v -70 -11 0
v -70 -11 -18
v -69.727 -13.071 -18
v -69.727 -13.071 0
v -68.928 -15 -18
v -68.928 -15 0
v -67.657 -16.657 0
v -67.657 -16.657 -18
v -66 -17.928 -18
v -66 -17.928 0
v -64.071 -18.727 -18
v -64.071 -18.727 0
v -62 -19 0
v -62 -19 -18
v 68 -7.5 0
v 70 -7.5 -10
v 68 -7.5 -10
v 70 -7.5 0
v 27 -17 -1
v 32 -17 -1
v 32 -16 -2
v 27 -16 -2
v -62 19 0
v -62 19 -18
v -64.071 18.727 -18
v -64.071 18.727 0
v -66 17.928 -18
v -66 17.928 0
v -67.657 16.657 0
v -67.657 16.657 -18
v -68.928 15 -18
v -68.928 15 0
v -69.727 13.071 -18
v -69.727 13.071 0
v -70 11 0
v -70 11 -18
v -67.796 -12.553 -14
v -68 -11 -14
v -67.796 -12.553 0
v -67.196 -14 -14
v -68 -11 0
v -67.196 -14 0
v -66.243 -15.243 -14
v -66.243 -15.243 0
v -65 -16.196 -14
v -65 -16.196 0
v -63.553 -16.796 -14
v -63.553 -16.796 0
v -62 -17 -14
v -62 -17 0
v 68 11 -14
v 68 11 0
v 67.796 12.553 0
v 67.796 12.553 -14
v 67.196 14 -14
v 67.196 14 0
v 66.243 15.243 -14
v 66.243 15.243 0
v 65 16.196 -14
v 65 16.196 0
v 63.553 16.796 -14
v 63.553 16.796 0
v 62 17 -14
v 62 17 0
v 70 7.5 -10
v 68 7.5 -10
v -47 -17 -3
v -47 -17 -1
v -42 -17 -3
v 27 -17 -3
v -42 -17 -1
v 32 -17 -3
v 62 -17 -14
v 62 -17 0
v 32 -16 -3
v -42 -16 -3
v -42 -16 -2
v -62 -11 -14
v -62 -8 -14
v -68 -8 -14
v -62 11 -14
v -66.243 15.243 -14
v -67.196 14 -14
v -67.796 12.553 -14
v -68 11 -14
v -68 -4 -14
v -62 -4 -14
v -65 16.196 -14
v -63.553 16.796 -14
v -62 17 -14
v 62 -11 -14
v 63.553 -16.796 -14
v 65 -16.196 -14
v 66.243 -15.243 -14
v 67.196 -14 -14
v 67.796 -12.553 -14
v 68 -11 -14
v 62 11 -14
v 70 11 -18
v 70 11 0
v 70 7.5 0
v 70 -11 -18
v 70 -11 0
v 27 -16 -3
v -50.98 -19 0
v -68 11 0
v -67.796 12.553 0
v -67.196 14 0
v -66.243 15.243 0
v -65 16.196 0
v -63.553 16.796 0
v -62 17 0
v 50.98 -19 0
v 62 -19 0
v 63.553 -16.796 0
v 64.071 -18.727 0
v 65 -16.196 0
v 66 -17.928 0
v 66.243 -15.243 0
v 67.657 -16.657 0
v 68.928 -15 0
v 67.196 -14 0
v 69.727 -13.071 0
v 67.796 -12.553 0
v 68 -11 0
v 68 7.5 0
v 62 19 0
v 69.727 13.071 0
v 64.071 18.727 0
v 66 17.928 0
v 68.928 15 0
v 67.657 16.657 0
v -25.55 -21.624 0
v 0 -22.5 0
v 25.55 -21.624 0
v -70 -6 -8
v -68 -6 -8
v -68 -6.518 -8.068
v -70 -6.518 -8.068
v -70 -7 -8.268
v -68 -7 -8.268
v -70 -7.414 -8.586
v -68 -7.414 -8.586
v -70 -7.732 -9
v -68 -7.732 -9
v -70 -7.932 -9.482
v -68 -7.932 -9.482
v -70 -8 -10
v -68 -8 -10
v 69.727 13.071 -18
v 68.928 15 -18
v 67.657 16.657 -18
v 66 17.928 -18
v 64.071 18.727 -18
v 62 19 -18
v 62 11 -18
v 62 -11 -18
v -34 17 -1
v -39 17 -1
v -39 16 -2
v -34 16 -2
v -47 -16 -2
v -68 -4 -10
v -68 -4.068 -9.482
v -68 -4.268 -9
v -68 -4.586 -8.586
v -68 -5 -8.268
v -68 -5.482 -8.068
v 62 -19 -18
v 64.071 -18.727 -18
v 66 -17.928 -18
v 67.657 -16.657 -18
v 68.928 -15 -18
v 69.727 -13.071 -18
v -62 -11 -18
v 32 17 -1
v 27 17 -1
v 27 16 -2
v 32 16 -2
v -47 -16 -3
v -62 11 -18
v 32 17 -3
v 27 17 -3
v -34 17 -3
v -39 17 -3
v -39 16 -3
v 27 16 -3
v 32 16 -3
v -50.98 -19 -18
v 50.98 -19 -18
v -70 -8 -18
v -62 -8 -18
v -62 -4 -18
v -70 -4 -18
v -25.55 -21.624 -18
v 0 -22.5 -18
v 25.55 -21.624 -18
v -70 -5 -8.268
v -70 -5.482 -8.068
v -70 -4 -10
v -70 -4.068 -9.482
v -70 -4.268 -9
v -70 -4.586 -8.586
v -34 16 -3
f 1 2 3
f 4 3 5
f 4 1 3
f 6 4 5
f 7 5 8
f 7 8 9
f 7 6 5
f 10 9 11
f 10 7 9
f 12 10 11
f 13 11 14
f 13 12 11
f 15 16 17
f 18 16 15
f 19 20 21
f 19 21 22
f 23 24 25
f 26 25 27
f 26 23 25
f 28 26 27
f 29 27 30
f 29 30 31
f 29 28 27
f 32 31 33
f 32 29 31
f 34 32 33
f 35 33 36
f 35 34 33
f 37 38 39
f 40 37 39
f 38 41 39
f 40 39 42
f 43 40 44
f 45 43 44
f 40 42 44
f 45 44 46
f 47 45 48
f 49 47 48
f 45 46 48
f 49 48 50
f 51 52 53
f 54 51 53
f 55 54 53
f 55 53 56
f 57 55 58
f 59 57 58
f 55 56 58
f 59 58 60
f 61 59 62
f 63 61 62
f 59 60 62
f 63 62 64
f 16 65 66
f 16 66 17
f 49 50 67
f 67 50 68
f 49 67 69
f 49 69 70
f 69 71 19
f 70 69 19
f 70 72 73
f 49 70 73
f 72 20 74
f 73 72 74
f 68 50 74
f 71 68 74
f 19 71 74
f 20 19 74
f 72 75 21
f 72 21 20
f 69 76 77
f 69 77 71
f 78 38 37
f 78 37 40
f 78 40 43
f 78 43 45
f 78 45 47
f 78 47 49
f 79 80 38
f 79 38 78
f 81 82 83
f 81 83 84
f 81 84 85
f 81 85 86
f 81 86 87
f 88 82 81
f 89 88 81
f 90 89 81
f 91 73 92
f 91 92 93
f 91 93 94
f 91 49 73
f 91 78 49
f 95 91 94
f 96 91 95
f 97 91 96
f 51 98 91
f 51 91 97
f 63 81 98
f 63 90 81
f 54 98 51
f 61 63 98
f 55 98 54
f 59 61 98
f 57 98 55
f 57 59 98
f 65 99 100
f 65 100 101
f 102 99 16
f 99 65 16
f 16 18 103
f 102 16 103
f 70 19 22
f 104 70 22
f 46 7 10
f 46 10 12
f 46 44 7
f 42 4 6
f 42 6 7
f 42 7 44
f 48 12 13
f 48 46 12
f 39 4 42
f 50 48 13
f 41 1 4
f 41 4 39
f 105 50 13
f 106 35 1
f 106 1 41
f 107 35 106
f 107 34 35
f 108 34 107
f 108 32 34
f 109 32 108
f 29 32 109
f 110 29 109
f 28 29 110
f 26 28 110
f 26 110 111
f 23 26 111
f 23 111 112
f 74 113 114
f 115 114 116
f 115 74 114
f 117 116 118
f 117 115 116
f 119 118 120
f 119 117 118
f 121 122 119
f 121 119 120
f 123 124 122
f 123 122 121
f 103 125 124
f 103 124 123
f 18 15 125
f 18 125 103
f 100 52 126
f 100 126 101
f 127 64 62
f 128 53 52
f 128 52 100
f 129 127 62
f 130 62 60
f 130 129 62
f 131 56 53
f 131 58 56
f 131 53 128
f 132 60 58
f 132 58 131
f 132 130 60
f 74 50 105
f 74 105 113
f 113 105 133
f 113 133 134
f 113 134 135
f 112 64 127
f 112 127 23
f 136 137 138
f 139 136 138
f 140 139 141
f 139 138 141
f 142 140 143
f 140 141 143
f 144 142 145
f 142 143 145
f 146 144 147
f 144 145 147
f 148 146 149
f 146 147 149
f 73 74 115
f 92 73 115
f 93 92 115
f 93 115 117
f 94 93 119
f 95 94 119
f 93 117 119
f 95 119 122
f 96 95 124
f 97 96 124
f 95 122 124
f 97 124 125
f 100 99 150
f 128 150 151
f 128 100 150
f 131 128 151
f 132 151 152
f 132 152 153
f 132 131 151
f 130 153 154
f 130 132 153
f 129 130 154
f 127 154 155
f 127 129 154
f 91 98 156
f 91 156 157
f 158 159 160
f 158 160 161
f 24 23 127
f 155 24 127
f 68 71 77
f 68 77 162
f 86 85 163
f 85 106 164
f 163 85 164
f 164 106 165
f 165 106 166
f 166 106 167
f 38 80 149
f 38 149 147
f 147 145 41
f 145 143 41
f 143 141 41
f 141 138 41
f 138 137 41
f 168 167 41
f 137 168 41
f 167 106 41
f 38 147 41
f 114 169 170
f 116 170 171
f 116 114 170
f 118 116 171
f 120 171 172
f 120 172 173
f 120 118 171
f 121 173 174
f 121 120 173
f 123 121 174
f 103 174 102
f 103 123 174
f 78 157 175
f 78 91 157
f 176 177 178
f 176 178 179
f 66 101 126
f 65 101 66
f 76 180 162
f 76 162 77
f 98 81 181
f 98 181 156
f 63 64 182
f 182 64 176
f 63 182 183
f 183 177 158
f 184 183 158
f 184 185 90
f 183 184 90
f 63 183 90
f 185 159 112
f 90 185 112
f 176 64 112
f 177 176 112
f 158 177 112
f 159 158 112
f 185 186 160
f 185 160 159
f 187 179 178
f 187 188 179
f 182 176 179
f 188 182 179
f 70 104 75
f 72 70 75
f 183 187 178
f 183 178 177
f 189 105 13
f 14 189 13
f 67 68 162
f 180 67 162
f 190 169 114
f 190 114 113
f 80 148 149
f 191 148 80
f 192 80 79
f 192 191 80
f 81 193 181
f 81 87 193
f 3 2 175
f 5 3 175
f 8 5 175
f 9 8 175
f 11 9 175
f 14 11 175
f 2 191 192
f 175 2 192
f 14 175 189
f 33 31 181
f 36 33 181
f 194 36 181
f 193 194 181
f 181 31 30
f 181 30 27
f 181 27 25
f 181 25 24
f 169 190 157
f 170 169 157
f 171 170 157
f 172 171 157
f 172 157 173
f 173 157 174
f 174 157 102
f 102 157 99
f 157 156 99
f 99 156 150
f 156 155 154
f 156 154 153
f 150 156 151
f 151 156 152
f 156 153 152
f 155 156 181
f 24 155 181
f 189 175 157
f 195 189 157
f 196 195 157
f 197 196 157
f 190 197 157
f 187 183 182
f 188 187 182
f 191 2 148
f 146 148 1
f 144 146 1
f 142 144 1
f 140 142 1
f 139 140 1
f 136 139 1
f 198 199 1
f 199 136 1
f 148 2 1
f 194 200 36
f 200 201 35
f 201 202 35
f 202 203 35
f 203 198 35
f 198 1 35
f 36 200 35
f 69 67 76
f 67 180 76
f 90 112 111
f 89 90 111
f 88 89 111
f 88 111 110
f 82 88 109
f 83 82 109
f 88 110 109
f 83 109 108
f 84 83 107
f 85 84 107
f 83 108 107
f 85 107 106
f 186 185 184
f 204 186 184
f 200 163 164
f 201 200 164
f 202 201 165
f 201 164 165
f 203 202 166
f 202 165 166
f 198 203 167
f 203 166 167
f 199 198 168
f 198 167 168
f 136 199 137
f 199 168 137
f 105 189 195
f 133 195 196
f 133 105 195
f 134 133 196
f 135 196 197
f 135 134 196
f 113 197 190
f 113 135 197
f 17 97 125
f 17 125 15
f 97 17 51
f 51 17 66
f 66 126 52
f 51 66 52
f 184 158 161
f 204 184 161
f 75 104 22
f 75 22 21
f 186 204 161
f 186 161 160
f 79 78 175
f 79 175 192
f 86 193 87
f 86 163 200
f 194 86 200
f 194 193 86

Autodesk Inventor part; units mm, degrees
ref_plane "YZ Plane" through (0, 0, 0) normal (1, 0, 0) x (0, 1, 0)
ref_plane "XZ Plane" through (0, 0, 0) normal (0, 1, 0) x (-1, 0, 0)
ref_plane "XY Plane" through (0, 0, 0) normal (0, 0, 1) x (1, 0, 0)
sketch "Sketch1" plane through (0, 0, 0) normal (0, 0, 1) x (1, 0, 0)
  line L0 (-62, 19) -> (62, 19)
  line L1 (70, 11) -> (70, -11)
  line L2 (62, -19) -> (-62, -19)
  line L3 (-70, -11) -> (-70, 11)
  arc A0 (-62, 19) -> (-70, 11) centre (-62, 11) ccw
  arc A1 (-70, -11) -> (-62, -19) centre (-62, -11) ccw
  arc A2 (70, 11) -> (62, 19) centre (62, 11) ccw
  arc A3 (62, -19) -> (70, -11) centre (62, -11) ccw
  point P0 (0, 0)
  point P1 (70, -19)
  point P2 (70, 19)
  point P3 (-70, -19)
  dimension "d0" = 140
  dimension "d1" = 38
  dimension "d2" = 70
  dimension "d3" = 19
  dimension "d4" = 8
  dimension "d5" = 8
  dimension "d6" = 8
  dimension "d7" = 8
extrude "Extrusion1" add sketch "Sketch1" against normal blind 18
sketch "Sketch2" plane through (0, 0, 0) normal (0, 0, 1) x (1, 0, 0)
  line L0 (-62, 19) -> (62, 19) projected
  arc A0 (-62, 19) -> (-70, 11) centre (-62, 11) ccw projected
  line L1 (-70, -11) -> (-70, 11) projected
  arc A1 (-70, -11) -> (-62, -19) centre (-62, -11) ccw projected
  line L2 (62, -19) -> (-62, -19) projected
  arc A2 (62, -19) -> (70, -11) centre (62, -11) ccw projected
  line L3 (70, 11) -> (70, -11) projected
  arc A3 (70, 11) -> (62, 19) centre (62, 11) ccw projected
  line L4 (62, 17) -> (-62, 17)
  arc A4 (-62, 17) -> (-68, 11) centre (-62, 11) ccw
  line L5 (-68, 11) -> (-68, -11)
  arc A5 (-68, -11) -> (-62, -17) centre (-62, -11) ccw
  line L6 (-62, -17) -> (62, -17)
  arc A6 (62, -17) -> (68, -11) centre (62, -11) ccw
  line L7 (68, -11) -> (68, 11)
  arc A7 (68, 11) -> (62, 17) centre (62, 11) ccw
  point P0 (0, 0)
  dimension "d10" = 2
extrude "Extrusion2" cut sketch "Sketch2" against normal blind 14 contours A7 L7 A6 L6 A5 L5 A4 L4
sketch "Sketch3" plane through (70, -11, 0) normal (1, 0, 0) x (0, 0, -1)
  line L0 (0, 22) -> (0, 0) projected
  line L1 (-6.9158, 18.5) -> (10, 18.5)
  line L2 (10, 18.5) -> (10, 3.5)
  line L3 (10, 3.5) -> (-6.9158, 3.5)
  line L4 (-6.9158, 3.5) -> (-6.9158, 18.5)
  point P0 (0, 11)
  dimension "d13" = 6.9158
  dimension "d14" = 10
  dimension "d15" = 15
  dimension "d16" = 7.5
extrude "Extrusion3" cut sketch "Sketch3" against normal blind 14
sketch "Sketch4" plane through (0, 0, -14) normal (0, 0, 1) x (1, 0, 0)
  line L0 (-62, -17) -> (62, -17) projected
  line L1 (62, 17) -> (-62, 17) projected
  line L2 (27, 19) -> (32, 19)
  line L3 (32, 19) -> (32, 16)
  line L4 (32, 16) -> (27, 16)
  line L5 (27, 16) -> (27, 19)
  line L6 (32, -19) -> (27, -19)
  line L7 (27, -19) -> (27, -16)
  line L8 (27, -16) -> (32, -16)
  line L9 (32, -16) -> (32, -19)
  line L10 (-42, -19) -> (-47, -19)
  line L11 (-47, -19) -> (-47, -16)
  line L12 (-47, -16) -> (-42, -16)
  line L13 (-42, -16) -> (-42, -19)
  line L14 (70, 7.5) -> (70, -7.5) projected
  line L15 (62, -19) -> (-62, -19) projected
  line L16 (-62, 19) -> (62, 19) projected
  line L17 (-39, 19) -> (-34, 19)
  line L18 (-34, 19) -> (-34, 16)
  line L19 (-34, 16) -> (-39, 16)
  line L20 (-39, 16) -> (-39, 19)
  line L21 (-70, -11) -> (-70, 11) projected
  point P0 (0, 0)
  dimension "d19" = 38
  dimension "d20" = 5
  dimension "d21" = 5
  dimension "d22" = 38
  dimension "d23" = 1
  dimension "d24" = 1
  dimension "d25" = 0
  dimension "d26" = 0
  dimension "d28" = 1
  dimension "d29" = 0
  dimension "d30" = 5
  dimension "d31" = 5
  dimension "d33" = 1
  dimension "d34" = 0
  dimension "d59" = 66
  dimension "d60" = 74
extrude "Extrusion4" add sketch "Sketch4" along normal blind 13 contours L11 L12 L13 L0 | L0 L13 L10 L11 | L7 L8 L9 L0 | L0 L9 L6 L7 | L3 L4 L5 L1 | L1 L5 L2 L3 | L18 L19 L20 L1 | L1 L20 L16 L18
chamfer "Chamfer1" distance 1 distance2 1 1 edges at (-36.5, 16, -1) measured on face at (-35.6667, 16, -9.6667)
chamfer "Chamfer3" distance 1 distance2 1 1 edges at (29.5, 16, -1) measured on face at (30.3333, 16, -9.6667)
chamfer "Chamfer4" distance 1 distance2 1 1 edges at (-44.5, -16, -1) measured on face at (-45.3333, -16, -9.6667)
chamfer "Chamfer5" distance 1 distance2 1 1 edges at (29.5, -16, -1) measured on face at (28.6667, -16, -9.6667)
sketch "Sketch5" plane through (0, 0, -14) normal (0, 0, 1) x (1, 0, 0)
  line L0 (-39, 17) -> (-62, 17) projected
  arc A0 (-62, 17) -> (-68, 11) centre (-62, 11) ccw projected
  line L1 (-68, 11) -> (-68, -11) projected
  arc A1 (-68, -11) -> (-62, -17) centre (-62, -11) ccw projected
  line L2 (-62, -17) -> (-47, -17) projected
  line L3 (-47, -17) -> (-47, -16) projected
  line L4 (-47, -16) -> (-42, -16) projected
  line L5 (-42, -16) -> (-42, -17) projected
  line L6 (-42, -17) -> (27, -17) projected
  line L7 (27, -17) -> (27, -16) projected
  line L8 (27, -16) -> (32, -16) projected
  line L9 (32, -16) -> (32, -17) projected
  line L10 (32, -17) -> (62, -17) projected
  line L11 (-49, 17) -> (37, 17)
  line L12 (37, 17) -> (37, -17)
  line L13 (37, -17) -> (-49, -17)
  line L14 (-49, -17) -> (-49, 17)
  point P0 (32, 16)
  point P1 (-39, 16)
  point P2 (0, 0)
  dimension "d53" = 10
  dimension "d54" = 5
extrude "Extrusion5" cut sketch "Sketch5" along normal blind 11
sketch "Sketch6" plane through (0, 0, -14) normal (0, 0, 1) x (1, 0, 0)
  arc A0 (62, -17) -> (68, -11) centre (62, -11) ccw projected
  arc A1 (-62, 17) -> (-68, 11) centre (-62, 11) ccw projected
  line L0 (-62, 11) -> (62, 11)
  line L1 (62, 11) -> (62, -11)
  line L2 (62, -11) -> (-62, -11)
  line L3 (-62, -11) -> (-62, 11)
  point P0 (0, 0)
extrude "Extrusion6" cut sketch "Sketch6" against normal through all
sketch "Sketch8" plane through (0, 0, 0) normal (0, 0, 1) x (1, 0, 0)
  line L0 (-70, -11) -> (-70, 11) projected
  line L1 (62, -19) -> (-62, -19) projected
  line L2 (70, -7.5) -> (70, -11) projected
  line L3 (62, -17) -> (-62, -17) projected
  line L4 (0, -22.5) -> (0, -17) construction
  arc A0 (-52, -18.8579) -> (52, -18.8579) centre (0, 350.5357) ccw
  arc A1 (-49.9899, -19.1353) -> (-52, -19) centre (-52, -34) ccw
  arc A2 (52, -19) -> (49.9899, -19.1353) centre (52, -34) ccw
  line L5 (-52, -19) -> (-52, -17)
  line L6 (52, -19) -> (52, -17)
  line L7 (52, -17) -> (-52, -17)
  point P0 (0, 0)
  dimension "d63" = 2
  dimension "d64" = 18
  dimension "d65" = 18
  dimension "d66" = 5.5
  dimension "d67" = 30
  dimension "d68" = 30
extrude "Extrusion8" add sketch "Sketch8" against normal up to surface (18 mm away) contours A0 L1 | L1 A0 L5 L3 L6
sketch "Sketch9" plane through (0, 0, -18) normal (0, 0, -1) x (-1, 0, 0)
  line L0 (70, 11) -> (70, -11) projected
  line L1 (62, 11) -> (62, -11) projected
  line L2 (62, -11) -> (-62, -11) projected
  line L3 (58, -4) -> (74, -4)
  line L4 (74, -4) -> (74, -8)
  line L5 (74, -8) -> (58, -8)
  line L6 (58, -8) -> (58, -4)
  point P0 (0, 0)
  dimension "d71" = 3
  dimension "d72" = 4
  dimension "d73" = 4
  dimension "d74" = 4
extrude "Extrusion9" cut sketch "Sketch9" against normal blind 10
fillet "Fillet1" radius 2 2 edges at (-69, -8, -8) (-69, -4, -8)
sketch "Sketch10" plane through (0, 0, -14) normal (0, 0, 1) x (1, 0, 0)
  line L0 (-62, -8) -> (-68, -8) projected
  line L1 (-68, -8) -> (-68, -11) projected
  arc A0 (-68, -11) -> (-62, -17) centre (-62, -11) ccw projected
  line L2 (-62, -17) -> (62, -17) projected
  arc A1 (62, -17) -> (68, -11) centre (62, -11) ccw projected
  line L3 (68, -11) -> (68, 11) projected
  arc A2 (68, 11) -> (62, 17) centre (62, 11) ccw projected
  line L4 (62, 17) -> (-62, 17) projected
  arc A3 (-62, 17) -> (-68, 11) centre (-62, 11) ccw projected
  line L5 (-68, 11) -> (-68, -4) projected
  line L6 (-68, -4) -> (-62, -4) projected
  line L7 (-62, -4) -> (-62, 11) projected
  line L8 (-62, 11) -> (62, 11) projected
  line L9 (62, 11) -> (62, -11) projected
  line L10 (62, -11) -> (-62, -11) projected
  line L11 (-62, -11) -> (-62, -8) projected
  point P0 (0, 0)
equation "\"d2\" = 0.5 * d0"
equation "\"d3\" = 0.5 * d1"
equation "\"d16\" = 0.5 * d15"
properties part number "mainmount"
